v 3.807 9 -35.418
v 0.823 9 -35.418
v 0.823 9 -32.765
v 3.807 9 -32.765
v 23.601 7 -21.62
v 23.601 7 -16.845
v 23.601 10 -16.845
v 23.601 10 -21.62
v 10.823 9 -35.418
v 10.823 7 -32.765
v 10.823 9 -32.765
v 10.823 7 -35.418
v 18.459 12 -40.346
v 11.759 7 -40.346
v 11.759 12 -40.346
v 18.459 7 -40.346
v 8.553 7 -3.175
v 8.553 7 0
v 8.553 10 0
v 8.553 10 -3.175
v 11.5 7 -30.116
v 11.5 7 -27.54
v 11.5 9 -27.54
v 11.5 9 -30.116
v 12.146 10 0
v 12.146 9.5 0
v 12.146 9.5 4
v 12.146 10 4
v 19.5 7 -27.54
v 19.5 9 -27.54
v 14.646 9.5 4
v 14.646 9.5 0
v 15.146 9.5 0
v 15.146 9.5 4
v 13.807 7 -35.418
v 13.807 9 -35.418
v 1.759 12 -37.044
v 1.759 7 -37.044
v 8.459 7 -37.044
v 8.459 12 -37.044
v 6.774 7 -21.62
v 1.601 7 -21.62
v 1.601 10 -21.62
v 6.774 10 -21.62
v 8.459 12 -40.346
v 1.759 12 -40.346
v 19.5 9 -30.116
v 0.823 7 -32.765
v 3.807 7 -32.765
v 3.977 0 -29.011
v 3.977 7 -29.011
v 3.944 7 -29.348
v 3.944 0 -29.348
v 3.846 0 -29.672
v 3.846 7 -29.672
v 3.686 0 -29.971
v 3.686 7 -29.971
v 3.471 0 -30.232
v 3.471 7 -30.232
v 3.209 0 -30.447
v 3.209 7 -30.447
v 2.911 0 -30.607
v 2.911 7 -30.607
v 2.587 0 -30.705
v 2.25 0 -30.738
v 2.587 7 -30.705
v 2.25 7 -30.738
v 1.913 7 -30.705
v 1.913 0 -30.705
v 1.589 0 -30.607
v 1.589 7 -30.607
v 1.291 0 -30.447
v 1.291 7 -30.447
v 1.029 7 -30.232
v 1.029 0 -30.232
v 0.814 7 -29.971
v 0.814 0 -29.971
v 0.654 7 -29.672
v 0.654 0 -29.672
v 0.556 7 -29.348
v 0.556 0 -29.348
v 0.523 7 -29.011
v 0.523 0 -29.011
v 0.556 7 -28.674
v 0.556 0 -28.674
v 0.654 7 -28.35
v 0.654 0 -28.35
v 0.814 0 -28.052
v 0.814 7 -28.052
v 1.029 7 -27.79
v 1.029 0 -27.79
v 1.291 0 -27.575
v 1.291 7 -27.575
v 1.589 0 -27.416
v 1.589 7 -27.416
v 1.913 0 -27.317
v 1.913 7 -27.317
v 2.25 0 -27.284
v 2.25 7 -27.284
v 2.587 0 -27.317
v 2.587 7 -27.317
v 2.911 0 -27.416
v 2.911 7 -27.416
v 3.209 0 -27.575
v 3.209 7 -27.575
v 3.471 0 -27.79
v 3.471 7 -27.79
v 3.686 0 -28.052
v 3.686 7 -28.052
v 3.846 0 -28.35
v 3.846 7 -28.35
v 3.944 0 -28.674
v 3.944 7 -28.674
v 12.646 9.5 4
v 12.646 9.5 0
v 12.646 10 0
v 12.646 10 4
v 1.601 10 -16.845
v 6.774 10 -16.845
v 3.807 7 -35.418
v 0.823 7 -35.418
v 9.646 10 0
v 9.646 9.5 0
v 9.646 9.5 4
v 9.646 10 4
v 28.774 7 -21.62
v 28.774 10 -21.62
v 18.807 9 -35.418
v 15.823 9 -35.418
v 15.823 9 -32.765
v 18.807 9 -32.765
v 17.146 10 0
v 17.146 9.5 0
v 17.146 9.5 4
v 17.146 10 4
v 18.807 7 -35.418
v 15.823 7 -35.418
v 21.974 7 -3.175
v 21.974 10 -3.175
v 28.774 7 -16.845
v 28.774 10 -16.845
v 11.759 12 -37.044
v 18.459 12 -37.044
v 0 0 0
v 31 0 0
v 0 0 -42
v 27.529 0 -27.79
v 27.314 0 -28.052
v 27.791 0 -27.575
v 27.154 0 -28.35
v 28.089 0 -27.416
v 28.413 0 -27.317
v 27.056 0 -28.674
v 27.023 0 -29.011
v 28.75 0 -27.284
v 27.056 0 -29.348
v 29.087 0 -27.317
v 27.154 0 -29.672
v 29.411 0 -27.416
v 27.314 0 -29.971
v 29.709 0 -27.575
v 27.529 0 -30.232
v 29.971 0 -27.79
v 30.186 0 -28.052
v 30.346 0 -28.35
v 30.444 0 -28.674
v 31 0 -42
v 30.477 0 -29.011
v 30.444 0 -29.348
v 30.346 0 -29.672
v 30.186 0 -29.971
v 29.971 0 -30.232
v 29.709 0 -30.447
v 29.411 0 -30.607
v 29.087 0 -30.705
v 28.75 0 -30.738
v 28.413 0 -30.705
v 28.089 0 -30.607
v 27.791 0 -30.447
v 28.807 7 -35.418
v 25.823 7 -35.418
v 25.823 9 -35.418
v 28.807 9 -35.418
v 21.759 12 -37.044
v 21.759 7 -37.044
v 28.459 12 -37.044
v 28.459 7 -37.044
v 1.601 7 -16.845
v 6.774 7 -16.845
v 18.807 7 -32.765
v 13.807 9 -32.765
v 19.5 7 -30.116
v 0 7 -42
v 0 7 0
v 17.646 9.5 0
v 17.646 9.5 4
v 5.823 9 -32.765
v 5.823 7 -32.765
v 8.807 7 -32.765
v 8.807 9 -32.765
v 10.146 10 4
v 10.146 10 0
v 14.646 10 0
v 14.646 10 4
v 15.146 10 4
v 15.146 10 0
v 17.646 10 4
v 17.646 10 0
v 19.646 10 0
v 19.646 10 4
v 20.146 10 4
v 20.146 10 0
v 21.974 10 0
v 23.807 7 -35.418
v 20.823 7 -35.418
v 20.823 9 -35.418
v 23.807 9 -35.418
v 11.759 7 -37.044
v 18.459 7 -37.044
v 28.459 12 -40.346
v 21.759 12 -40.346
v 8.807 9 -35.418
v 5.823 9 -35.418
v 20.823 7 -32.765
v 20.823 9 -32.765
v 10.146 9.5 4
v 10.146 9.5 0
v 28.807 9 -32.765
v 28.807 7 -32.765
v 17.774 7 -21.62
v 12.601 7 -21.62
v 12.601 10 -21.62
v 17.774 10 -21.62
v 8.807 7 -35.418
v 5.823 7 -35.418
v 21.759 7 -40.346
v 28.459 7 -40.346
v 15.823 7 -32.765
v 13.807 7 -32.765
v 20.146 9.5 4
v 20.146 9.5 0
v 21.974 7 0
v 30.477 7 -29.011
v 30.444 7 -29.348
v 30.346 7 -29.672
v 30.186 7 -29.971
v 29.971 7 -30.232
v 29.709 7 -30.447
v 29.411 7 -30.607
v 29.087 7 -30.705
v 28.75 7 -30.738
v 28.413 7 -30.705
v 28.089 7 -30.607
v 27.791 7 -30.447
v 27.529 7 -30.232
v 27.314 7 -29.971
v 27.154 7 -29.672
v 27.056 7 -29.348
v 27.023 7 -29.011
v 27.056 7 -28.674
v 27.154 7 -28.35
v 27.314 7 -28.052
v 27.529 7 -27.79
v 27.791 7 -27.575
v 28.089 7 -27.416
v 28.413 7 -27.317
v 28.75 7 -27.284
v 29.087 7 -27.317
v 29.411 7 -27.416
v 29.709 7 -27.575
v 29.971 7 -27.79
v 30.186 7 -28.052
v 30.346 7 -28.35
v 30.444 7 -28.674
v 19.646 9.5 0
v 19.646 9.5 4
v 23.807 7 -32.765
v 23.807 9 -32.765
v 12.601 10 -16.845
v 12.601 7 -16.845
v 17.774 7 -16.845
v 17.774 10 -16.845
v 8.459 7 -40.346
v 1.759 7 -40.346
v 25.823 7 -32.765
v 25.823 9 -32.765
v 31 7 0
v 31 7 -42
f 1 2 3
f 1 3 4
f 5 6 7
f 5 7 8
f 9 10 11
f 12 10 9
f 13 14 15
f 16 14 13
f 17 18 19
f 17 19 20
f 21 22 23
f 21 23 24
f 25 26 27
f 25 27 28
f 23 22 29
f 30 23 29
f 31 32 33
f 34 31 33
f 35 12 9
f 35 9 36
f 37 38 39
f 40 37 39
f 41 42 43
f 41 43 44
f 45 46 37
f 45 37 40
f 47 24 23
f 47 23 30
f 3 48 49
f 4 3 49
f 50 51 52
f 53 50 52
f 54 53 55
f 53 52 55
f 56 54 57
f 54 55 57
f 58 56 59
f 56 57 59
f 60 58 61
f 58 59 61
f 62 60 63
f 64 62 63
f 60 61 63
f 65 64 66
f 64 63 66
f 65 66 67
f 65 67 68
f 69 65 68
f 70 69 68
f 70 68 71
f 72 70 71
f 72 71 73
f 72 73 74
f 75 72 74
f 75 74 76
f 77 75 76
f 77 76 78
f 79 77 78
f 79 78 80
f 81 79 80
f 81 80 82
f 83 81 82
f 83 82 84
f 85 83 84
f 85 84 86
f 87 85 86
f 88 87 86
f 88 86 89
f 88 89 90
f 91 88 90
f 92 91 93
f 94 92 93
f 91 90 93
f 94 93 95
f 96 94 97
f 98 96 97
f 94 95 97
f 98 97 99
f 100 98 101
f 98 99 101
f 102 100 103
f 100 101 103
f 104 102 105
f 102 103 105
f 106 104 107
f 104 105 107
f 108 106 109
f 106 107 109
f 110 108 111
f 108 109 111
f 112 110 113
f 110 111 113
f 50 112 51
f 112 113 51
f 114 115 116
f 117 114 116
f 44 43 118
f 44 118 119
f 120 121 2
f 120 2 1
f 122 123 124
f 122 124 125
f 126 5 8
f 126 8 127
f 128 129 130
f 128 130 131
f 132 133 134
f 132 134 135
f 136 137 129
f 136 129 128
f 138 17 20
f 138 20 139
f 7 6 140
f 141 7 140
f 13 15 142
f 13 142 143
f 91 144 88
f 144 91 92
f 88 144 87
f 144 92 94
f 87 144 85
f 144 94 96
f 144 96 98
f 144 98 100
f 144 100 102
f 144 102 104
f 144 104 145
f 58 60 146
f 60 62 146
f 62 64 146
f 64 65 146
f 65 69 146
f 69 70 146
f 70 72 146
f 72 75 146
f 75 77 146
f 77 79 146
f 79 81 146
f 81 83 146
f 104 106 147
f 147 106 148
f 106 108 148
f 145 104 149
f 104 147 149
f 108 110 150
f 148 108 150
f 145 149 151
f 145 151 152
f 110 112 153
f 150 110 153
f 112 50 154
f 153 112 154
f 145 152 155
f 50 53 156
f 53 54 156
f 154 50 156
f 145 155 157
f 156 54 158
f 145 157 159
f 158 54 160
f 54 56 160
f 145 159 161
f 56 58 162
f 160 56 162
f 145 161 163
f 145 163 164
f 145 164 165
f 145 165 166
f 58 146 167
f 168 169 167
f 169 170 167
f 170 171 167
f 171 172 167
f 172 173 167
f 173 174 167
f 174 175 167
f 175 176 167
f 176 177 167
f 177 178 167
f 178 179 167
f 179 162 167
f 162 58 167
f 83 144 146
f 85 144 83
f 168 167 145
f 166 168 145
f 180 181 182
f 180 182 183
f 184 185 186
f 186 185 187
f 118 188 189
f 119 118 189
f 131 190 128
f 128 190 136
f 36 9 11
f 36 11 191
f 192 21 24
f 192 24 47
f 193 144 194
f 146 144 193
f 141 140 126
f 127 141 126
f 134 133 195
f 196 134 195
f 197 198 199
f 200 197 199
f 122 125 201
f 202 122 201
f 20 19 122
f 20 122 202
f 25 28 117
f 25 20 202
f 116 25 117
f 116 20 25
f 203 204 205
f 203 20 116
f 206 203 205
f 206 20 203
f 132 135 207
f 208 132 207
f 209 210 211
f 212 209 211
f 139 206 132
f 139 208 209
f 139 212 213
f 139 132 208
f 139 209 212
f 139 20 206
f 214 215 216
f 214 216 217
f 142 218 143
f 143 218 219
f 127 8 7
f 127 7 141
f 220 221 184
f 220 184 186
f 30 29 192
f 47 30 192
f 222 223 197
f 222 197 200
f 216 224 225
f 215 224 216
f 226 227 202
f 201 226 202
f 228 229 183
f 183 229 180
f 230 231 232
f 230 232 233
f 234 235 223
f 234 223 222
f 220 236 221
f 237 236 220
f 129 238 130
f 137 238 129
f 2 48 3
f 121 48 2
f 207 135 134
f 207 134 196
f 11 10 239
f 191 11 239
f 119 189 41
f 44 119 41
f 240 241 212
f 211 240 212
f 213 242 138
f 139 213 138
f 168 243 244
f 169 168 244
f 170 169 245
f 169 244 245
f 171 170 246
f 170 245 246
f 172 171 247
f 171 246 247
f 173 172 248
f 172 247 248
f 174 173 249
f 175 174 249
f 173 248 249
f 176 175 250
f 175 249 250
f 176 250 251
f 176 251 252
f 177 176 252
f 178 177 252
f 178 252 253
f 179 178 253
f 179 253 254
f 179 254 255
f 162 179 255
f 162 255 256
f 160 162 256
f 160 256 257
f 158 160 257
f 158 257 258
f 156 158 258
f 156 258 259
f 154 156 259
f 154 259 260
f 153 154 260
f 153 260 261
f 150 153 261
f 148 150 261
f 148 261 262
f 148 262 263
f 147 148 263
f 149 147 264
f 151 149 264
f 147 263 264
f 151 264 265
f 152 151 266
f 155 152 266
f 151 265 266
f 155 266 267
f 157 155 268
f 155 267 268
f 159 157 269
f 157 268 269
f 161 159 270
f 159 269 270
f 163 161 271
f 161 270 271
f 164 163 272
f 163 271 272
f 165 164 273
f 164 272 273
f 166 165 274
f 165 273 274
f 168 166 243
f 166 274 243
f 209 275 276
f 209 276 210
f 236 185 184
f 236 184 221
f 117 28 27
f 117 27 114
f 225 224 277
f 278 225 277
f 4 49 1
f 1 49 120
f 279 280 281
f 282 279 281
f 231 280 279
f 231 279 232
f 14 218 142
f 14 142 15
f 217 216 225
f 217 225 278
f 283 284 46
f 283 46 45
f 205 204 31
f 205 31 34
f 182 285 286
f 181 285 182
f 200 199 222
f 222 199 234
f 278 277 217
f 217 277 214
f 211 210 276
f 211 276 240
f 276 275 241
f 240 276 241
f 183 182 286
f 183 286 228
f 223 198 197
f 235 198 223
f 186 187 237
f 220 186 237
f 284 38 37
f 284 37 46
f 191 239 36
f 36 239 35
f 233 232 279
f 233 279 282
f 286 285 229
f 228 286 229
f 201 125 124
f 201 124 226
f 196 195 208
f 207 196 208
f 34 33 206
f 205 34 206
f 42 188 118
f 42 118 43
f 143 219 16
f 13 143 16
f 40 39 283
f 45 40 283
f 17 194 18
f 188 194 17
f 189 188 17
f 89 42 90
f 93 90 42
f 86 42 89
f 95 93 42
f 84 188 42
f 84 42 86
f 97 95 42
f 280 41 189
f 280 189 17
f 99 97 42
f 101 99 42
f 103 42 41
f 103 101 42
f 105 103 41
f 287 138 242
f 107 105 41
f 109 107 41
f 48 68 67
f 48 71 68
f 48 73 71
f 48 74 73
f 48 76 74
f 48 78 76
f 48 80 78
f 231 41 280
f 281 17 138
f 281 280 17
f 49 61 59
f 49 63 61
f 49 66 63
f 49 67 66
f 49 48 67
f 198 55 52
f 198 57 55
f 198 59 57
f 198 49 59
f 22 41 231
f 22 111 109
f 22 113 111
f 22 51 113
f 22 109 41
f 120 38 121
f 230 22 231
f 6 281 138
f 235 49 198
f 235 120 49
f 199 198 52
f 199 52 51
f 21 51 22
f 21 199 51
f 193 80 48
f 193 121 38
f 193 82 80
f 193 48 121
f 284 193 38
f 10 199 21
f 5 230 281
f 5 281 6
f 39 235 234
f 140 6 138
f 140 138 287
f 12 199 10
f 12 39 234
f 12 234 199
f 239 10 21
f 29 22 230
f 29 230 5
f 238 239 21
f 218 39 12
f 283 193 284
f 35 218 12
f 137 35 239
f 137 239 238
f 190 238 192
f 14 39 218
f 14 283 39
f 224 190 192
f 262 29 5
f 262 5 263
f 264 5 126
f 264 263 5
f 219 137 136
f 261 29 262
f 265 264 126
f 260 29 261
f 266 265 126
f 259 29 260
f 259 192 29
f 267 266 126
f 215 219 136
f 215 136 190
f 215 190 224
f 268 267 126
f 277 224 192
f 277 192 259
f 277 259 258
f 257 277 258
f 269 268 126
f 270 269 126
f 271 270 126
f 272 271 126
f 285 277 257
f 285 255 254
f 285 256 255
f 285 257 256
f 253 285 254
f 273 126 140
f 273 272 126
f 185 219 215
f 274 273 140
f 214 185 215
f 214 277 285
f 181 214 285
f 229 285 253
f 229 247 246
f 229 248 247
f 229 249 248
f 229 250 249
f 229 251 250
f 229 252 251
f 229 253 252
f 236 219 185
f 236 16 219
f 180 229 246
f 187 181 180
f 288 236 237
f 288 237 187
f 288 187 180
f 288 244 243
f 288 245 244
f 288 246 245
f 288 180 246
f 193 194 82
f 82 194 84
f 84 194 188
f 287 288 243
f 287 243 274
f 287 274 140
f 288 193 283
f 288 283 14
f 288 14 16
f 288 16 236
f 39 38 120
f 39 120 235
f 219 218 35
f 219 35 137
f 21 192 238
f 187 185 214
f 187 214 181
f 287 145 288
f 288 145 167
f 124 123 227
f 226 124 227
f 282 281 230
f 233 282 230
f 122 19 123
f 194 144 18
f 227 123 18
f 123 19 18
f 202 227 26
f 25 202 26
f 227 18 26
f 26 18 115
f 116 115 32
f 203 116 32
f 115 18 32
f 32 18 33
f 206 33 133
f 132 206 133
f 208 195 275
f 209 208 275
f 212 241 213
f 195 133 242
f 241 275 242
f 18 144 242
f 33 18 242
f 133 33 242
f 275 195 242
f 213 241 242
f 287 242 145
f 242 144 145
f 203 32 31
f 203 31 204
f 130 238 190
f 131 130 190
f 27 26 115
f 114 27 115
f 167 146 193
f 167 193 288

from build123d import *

# Parameters (mm, degrees)
SKETCH_1_W          = 31
SKETCH_1_H          = 42
EXTRUDE_1_DEPTH     = 7
SKETCH_3_W          = 6.699750495
SKETCH_3_H          = 3.302693905
EXTRUDE_2_DEPTH     = 5
SKETCH_4_W          = 2.984504837
SKETCH_4_H          = 2.652893189
EXTRUDE_3_DEPTH     = 2
SKETCH_5_W          = 8
SKETCH_5_H          = 2.576224576
EXTRUDE_4_DEPTH     = 2
SKETCH_6_R          = 1.726982995
CUT_EXTRUDE_1_DEPTH = 8
SKETCH_7_W          = 5.173141718
SKETCH_7_H          = 4.77520774
SKETCH_7_W_2        = 13.421733696
SKETCH_7_H_2        = 3.175273919
EXTRUDE_5_DEPTH     = 3
SKETCH_8_W          = 0.5
SKETCH_8_H          = 0.5
EXTRUDE_6_DEPTH     = 4


with BuildPart() as part:
    # 草圖1 → 填料-伸長1 (new body)
    with BuildSketch(Plane(origin=(0, 0, 0), x_dir=(1, 0, 0), z_dir=(0, 1, 0))):
        with Locations((15.5, 21)):
            Rectangle(SKETCH_1_W, SKETCH_1_H)
    extrude(amount=EXTRUDE_1_DEPTH)

    # 草圖3 → 填料-伸長2 (add)
    with BuildSketch(Plane(origin=(0, 7, 0), x_dir=(1, 0, 0), z_dir=(0, 1, 0))):
        with Locations((15.108684373, 38.694954661)):
            Rectangle(SKETCH_3_W, SKETCH_3_H)
        with Locations((5.108684373, 38.694954661)):
            Rectangle(SKETCH_3_W, SKETCH_3_H)
        with Locations((25.108684373, 38.694954661)):
            Rectangle(SKETCH_3_W, SKETCH_3_H)
    extrude(amount=EXTRUDE_2_DEPTH)

    # 草圖4 → 填料-伸長3 (add)
    with BuildSketch(Plane(origin=(0, 7, 0), x_dir=(1, 0, 0), z_dir=(0, 1, 0))):
        with Locations((7.315015434, 34.091646646)):
            Rectangle(SKETCH_4_W, SKETCH_4_H)
        with Locations((2.315015434, 34.091646646)):
            Rectangle(SKETCH_4_W, SKETCH_4_H)
        with Locations((12.315015434, 34.091646646)):
            Rectangle(SKETCH_4_W, SKETCH_4_H)
        with Locations((17.315015434, 34.091646646)):
            Rectangle(SKETCH_4_W, SKETCH_4_H)
        with Locations((22.315015434, 34.091646646)):
            Rectangle(SKETCH_4_W, SKETCH_4_H)
        with Locations((27.315015434, 34.091646646)):
            Rectangle(SKETCH_4_W, SKETCH_4_H)
    extrude(amount=EXTRUDE_3_DEPTH)

    # 草圖5 → 填料-伸長4 (add)
    with BuildSketch(Plane(origin=(0, 7, 0), x_dir=(1, 0, 0), z_dir=(0, 1, 0))):
        with Locations((15.5, 28.828363784)):
            Rectangle(SKETCH_5_W, SKETCH_5_H)
    extrude(amount=EXTRUDE_4_DEPTH)

    # 草圖6 → 除料-伸長1 (cut, through all)
    with BuildSketch(Plane(origin=(0, 7, 0), x_dir=(1, 0, 0), z_dir=(0, 1, 0))):
        with Locations((2.25, 29.011078955)):
            Circle(SKETCH_6_R)
        with Locations((28.75, 29.011078955)):
            Circle(SKETCH_6_R)
    extrude(amount=-CUT_EXTRUDE_1_DEPTH, mode=Mode.SUBTRACT)

    # 草圖7 → 填料-伸長5 (add)
    with BuildSketch(Plane(origin=(0, 7, 0), x_dir=(1, 0, 0), z_dir=(0, 1, 0))):
        with Locations((15.187222404, 19.232590782)):
            Rectangle(SKETCH_7_W, SKETCH_7_H)
        with Locations((4.187222404, 19.232590782)):
            Rectangle(SKETCH_7_W, SKETCH_7_H)
        with Locations((26.187222404, 19.232590782)):
            Rectangle(SKETCH_7_W, SKETCH_7_H)
        with Locations((15.263552758, 1.58763696)):
            Rectangle(SKETCH_7_W_2, SKETCH_7_H_2)
    extrude(amount=EXTRUDE_5_DEPTH)

    # 草圖8 → 填料-伸長6 (add)
    with BuildSketch(Plane.XY):
        with Locations((9.895624486, 9.75)):
            Rectangle(SKETCH_8_W, SKETCH_8_H)
        with Locations((12.395624486, 9.75)):
            Rectangle(SKETCH_8_W, SKETCH_8_H)
        with Locations((14.895624486, 9.75)):
            Rectangle(SKETCH_8_W, SKETCH_8_H)
        with Locations((17.395624486, 9.75)):
            Rectangle(SKETCH_8_W, SKETCH_8_H)
        with Locations((19.895624486, 9.75)):
            Rectangle(SKETCH_8_W, SKETCH_8_H)
    extrude(amount=EXTRUDE_6_DEPTH)


solid = part.part
